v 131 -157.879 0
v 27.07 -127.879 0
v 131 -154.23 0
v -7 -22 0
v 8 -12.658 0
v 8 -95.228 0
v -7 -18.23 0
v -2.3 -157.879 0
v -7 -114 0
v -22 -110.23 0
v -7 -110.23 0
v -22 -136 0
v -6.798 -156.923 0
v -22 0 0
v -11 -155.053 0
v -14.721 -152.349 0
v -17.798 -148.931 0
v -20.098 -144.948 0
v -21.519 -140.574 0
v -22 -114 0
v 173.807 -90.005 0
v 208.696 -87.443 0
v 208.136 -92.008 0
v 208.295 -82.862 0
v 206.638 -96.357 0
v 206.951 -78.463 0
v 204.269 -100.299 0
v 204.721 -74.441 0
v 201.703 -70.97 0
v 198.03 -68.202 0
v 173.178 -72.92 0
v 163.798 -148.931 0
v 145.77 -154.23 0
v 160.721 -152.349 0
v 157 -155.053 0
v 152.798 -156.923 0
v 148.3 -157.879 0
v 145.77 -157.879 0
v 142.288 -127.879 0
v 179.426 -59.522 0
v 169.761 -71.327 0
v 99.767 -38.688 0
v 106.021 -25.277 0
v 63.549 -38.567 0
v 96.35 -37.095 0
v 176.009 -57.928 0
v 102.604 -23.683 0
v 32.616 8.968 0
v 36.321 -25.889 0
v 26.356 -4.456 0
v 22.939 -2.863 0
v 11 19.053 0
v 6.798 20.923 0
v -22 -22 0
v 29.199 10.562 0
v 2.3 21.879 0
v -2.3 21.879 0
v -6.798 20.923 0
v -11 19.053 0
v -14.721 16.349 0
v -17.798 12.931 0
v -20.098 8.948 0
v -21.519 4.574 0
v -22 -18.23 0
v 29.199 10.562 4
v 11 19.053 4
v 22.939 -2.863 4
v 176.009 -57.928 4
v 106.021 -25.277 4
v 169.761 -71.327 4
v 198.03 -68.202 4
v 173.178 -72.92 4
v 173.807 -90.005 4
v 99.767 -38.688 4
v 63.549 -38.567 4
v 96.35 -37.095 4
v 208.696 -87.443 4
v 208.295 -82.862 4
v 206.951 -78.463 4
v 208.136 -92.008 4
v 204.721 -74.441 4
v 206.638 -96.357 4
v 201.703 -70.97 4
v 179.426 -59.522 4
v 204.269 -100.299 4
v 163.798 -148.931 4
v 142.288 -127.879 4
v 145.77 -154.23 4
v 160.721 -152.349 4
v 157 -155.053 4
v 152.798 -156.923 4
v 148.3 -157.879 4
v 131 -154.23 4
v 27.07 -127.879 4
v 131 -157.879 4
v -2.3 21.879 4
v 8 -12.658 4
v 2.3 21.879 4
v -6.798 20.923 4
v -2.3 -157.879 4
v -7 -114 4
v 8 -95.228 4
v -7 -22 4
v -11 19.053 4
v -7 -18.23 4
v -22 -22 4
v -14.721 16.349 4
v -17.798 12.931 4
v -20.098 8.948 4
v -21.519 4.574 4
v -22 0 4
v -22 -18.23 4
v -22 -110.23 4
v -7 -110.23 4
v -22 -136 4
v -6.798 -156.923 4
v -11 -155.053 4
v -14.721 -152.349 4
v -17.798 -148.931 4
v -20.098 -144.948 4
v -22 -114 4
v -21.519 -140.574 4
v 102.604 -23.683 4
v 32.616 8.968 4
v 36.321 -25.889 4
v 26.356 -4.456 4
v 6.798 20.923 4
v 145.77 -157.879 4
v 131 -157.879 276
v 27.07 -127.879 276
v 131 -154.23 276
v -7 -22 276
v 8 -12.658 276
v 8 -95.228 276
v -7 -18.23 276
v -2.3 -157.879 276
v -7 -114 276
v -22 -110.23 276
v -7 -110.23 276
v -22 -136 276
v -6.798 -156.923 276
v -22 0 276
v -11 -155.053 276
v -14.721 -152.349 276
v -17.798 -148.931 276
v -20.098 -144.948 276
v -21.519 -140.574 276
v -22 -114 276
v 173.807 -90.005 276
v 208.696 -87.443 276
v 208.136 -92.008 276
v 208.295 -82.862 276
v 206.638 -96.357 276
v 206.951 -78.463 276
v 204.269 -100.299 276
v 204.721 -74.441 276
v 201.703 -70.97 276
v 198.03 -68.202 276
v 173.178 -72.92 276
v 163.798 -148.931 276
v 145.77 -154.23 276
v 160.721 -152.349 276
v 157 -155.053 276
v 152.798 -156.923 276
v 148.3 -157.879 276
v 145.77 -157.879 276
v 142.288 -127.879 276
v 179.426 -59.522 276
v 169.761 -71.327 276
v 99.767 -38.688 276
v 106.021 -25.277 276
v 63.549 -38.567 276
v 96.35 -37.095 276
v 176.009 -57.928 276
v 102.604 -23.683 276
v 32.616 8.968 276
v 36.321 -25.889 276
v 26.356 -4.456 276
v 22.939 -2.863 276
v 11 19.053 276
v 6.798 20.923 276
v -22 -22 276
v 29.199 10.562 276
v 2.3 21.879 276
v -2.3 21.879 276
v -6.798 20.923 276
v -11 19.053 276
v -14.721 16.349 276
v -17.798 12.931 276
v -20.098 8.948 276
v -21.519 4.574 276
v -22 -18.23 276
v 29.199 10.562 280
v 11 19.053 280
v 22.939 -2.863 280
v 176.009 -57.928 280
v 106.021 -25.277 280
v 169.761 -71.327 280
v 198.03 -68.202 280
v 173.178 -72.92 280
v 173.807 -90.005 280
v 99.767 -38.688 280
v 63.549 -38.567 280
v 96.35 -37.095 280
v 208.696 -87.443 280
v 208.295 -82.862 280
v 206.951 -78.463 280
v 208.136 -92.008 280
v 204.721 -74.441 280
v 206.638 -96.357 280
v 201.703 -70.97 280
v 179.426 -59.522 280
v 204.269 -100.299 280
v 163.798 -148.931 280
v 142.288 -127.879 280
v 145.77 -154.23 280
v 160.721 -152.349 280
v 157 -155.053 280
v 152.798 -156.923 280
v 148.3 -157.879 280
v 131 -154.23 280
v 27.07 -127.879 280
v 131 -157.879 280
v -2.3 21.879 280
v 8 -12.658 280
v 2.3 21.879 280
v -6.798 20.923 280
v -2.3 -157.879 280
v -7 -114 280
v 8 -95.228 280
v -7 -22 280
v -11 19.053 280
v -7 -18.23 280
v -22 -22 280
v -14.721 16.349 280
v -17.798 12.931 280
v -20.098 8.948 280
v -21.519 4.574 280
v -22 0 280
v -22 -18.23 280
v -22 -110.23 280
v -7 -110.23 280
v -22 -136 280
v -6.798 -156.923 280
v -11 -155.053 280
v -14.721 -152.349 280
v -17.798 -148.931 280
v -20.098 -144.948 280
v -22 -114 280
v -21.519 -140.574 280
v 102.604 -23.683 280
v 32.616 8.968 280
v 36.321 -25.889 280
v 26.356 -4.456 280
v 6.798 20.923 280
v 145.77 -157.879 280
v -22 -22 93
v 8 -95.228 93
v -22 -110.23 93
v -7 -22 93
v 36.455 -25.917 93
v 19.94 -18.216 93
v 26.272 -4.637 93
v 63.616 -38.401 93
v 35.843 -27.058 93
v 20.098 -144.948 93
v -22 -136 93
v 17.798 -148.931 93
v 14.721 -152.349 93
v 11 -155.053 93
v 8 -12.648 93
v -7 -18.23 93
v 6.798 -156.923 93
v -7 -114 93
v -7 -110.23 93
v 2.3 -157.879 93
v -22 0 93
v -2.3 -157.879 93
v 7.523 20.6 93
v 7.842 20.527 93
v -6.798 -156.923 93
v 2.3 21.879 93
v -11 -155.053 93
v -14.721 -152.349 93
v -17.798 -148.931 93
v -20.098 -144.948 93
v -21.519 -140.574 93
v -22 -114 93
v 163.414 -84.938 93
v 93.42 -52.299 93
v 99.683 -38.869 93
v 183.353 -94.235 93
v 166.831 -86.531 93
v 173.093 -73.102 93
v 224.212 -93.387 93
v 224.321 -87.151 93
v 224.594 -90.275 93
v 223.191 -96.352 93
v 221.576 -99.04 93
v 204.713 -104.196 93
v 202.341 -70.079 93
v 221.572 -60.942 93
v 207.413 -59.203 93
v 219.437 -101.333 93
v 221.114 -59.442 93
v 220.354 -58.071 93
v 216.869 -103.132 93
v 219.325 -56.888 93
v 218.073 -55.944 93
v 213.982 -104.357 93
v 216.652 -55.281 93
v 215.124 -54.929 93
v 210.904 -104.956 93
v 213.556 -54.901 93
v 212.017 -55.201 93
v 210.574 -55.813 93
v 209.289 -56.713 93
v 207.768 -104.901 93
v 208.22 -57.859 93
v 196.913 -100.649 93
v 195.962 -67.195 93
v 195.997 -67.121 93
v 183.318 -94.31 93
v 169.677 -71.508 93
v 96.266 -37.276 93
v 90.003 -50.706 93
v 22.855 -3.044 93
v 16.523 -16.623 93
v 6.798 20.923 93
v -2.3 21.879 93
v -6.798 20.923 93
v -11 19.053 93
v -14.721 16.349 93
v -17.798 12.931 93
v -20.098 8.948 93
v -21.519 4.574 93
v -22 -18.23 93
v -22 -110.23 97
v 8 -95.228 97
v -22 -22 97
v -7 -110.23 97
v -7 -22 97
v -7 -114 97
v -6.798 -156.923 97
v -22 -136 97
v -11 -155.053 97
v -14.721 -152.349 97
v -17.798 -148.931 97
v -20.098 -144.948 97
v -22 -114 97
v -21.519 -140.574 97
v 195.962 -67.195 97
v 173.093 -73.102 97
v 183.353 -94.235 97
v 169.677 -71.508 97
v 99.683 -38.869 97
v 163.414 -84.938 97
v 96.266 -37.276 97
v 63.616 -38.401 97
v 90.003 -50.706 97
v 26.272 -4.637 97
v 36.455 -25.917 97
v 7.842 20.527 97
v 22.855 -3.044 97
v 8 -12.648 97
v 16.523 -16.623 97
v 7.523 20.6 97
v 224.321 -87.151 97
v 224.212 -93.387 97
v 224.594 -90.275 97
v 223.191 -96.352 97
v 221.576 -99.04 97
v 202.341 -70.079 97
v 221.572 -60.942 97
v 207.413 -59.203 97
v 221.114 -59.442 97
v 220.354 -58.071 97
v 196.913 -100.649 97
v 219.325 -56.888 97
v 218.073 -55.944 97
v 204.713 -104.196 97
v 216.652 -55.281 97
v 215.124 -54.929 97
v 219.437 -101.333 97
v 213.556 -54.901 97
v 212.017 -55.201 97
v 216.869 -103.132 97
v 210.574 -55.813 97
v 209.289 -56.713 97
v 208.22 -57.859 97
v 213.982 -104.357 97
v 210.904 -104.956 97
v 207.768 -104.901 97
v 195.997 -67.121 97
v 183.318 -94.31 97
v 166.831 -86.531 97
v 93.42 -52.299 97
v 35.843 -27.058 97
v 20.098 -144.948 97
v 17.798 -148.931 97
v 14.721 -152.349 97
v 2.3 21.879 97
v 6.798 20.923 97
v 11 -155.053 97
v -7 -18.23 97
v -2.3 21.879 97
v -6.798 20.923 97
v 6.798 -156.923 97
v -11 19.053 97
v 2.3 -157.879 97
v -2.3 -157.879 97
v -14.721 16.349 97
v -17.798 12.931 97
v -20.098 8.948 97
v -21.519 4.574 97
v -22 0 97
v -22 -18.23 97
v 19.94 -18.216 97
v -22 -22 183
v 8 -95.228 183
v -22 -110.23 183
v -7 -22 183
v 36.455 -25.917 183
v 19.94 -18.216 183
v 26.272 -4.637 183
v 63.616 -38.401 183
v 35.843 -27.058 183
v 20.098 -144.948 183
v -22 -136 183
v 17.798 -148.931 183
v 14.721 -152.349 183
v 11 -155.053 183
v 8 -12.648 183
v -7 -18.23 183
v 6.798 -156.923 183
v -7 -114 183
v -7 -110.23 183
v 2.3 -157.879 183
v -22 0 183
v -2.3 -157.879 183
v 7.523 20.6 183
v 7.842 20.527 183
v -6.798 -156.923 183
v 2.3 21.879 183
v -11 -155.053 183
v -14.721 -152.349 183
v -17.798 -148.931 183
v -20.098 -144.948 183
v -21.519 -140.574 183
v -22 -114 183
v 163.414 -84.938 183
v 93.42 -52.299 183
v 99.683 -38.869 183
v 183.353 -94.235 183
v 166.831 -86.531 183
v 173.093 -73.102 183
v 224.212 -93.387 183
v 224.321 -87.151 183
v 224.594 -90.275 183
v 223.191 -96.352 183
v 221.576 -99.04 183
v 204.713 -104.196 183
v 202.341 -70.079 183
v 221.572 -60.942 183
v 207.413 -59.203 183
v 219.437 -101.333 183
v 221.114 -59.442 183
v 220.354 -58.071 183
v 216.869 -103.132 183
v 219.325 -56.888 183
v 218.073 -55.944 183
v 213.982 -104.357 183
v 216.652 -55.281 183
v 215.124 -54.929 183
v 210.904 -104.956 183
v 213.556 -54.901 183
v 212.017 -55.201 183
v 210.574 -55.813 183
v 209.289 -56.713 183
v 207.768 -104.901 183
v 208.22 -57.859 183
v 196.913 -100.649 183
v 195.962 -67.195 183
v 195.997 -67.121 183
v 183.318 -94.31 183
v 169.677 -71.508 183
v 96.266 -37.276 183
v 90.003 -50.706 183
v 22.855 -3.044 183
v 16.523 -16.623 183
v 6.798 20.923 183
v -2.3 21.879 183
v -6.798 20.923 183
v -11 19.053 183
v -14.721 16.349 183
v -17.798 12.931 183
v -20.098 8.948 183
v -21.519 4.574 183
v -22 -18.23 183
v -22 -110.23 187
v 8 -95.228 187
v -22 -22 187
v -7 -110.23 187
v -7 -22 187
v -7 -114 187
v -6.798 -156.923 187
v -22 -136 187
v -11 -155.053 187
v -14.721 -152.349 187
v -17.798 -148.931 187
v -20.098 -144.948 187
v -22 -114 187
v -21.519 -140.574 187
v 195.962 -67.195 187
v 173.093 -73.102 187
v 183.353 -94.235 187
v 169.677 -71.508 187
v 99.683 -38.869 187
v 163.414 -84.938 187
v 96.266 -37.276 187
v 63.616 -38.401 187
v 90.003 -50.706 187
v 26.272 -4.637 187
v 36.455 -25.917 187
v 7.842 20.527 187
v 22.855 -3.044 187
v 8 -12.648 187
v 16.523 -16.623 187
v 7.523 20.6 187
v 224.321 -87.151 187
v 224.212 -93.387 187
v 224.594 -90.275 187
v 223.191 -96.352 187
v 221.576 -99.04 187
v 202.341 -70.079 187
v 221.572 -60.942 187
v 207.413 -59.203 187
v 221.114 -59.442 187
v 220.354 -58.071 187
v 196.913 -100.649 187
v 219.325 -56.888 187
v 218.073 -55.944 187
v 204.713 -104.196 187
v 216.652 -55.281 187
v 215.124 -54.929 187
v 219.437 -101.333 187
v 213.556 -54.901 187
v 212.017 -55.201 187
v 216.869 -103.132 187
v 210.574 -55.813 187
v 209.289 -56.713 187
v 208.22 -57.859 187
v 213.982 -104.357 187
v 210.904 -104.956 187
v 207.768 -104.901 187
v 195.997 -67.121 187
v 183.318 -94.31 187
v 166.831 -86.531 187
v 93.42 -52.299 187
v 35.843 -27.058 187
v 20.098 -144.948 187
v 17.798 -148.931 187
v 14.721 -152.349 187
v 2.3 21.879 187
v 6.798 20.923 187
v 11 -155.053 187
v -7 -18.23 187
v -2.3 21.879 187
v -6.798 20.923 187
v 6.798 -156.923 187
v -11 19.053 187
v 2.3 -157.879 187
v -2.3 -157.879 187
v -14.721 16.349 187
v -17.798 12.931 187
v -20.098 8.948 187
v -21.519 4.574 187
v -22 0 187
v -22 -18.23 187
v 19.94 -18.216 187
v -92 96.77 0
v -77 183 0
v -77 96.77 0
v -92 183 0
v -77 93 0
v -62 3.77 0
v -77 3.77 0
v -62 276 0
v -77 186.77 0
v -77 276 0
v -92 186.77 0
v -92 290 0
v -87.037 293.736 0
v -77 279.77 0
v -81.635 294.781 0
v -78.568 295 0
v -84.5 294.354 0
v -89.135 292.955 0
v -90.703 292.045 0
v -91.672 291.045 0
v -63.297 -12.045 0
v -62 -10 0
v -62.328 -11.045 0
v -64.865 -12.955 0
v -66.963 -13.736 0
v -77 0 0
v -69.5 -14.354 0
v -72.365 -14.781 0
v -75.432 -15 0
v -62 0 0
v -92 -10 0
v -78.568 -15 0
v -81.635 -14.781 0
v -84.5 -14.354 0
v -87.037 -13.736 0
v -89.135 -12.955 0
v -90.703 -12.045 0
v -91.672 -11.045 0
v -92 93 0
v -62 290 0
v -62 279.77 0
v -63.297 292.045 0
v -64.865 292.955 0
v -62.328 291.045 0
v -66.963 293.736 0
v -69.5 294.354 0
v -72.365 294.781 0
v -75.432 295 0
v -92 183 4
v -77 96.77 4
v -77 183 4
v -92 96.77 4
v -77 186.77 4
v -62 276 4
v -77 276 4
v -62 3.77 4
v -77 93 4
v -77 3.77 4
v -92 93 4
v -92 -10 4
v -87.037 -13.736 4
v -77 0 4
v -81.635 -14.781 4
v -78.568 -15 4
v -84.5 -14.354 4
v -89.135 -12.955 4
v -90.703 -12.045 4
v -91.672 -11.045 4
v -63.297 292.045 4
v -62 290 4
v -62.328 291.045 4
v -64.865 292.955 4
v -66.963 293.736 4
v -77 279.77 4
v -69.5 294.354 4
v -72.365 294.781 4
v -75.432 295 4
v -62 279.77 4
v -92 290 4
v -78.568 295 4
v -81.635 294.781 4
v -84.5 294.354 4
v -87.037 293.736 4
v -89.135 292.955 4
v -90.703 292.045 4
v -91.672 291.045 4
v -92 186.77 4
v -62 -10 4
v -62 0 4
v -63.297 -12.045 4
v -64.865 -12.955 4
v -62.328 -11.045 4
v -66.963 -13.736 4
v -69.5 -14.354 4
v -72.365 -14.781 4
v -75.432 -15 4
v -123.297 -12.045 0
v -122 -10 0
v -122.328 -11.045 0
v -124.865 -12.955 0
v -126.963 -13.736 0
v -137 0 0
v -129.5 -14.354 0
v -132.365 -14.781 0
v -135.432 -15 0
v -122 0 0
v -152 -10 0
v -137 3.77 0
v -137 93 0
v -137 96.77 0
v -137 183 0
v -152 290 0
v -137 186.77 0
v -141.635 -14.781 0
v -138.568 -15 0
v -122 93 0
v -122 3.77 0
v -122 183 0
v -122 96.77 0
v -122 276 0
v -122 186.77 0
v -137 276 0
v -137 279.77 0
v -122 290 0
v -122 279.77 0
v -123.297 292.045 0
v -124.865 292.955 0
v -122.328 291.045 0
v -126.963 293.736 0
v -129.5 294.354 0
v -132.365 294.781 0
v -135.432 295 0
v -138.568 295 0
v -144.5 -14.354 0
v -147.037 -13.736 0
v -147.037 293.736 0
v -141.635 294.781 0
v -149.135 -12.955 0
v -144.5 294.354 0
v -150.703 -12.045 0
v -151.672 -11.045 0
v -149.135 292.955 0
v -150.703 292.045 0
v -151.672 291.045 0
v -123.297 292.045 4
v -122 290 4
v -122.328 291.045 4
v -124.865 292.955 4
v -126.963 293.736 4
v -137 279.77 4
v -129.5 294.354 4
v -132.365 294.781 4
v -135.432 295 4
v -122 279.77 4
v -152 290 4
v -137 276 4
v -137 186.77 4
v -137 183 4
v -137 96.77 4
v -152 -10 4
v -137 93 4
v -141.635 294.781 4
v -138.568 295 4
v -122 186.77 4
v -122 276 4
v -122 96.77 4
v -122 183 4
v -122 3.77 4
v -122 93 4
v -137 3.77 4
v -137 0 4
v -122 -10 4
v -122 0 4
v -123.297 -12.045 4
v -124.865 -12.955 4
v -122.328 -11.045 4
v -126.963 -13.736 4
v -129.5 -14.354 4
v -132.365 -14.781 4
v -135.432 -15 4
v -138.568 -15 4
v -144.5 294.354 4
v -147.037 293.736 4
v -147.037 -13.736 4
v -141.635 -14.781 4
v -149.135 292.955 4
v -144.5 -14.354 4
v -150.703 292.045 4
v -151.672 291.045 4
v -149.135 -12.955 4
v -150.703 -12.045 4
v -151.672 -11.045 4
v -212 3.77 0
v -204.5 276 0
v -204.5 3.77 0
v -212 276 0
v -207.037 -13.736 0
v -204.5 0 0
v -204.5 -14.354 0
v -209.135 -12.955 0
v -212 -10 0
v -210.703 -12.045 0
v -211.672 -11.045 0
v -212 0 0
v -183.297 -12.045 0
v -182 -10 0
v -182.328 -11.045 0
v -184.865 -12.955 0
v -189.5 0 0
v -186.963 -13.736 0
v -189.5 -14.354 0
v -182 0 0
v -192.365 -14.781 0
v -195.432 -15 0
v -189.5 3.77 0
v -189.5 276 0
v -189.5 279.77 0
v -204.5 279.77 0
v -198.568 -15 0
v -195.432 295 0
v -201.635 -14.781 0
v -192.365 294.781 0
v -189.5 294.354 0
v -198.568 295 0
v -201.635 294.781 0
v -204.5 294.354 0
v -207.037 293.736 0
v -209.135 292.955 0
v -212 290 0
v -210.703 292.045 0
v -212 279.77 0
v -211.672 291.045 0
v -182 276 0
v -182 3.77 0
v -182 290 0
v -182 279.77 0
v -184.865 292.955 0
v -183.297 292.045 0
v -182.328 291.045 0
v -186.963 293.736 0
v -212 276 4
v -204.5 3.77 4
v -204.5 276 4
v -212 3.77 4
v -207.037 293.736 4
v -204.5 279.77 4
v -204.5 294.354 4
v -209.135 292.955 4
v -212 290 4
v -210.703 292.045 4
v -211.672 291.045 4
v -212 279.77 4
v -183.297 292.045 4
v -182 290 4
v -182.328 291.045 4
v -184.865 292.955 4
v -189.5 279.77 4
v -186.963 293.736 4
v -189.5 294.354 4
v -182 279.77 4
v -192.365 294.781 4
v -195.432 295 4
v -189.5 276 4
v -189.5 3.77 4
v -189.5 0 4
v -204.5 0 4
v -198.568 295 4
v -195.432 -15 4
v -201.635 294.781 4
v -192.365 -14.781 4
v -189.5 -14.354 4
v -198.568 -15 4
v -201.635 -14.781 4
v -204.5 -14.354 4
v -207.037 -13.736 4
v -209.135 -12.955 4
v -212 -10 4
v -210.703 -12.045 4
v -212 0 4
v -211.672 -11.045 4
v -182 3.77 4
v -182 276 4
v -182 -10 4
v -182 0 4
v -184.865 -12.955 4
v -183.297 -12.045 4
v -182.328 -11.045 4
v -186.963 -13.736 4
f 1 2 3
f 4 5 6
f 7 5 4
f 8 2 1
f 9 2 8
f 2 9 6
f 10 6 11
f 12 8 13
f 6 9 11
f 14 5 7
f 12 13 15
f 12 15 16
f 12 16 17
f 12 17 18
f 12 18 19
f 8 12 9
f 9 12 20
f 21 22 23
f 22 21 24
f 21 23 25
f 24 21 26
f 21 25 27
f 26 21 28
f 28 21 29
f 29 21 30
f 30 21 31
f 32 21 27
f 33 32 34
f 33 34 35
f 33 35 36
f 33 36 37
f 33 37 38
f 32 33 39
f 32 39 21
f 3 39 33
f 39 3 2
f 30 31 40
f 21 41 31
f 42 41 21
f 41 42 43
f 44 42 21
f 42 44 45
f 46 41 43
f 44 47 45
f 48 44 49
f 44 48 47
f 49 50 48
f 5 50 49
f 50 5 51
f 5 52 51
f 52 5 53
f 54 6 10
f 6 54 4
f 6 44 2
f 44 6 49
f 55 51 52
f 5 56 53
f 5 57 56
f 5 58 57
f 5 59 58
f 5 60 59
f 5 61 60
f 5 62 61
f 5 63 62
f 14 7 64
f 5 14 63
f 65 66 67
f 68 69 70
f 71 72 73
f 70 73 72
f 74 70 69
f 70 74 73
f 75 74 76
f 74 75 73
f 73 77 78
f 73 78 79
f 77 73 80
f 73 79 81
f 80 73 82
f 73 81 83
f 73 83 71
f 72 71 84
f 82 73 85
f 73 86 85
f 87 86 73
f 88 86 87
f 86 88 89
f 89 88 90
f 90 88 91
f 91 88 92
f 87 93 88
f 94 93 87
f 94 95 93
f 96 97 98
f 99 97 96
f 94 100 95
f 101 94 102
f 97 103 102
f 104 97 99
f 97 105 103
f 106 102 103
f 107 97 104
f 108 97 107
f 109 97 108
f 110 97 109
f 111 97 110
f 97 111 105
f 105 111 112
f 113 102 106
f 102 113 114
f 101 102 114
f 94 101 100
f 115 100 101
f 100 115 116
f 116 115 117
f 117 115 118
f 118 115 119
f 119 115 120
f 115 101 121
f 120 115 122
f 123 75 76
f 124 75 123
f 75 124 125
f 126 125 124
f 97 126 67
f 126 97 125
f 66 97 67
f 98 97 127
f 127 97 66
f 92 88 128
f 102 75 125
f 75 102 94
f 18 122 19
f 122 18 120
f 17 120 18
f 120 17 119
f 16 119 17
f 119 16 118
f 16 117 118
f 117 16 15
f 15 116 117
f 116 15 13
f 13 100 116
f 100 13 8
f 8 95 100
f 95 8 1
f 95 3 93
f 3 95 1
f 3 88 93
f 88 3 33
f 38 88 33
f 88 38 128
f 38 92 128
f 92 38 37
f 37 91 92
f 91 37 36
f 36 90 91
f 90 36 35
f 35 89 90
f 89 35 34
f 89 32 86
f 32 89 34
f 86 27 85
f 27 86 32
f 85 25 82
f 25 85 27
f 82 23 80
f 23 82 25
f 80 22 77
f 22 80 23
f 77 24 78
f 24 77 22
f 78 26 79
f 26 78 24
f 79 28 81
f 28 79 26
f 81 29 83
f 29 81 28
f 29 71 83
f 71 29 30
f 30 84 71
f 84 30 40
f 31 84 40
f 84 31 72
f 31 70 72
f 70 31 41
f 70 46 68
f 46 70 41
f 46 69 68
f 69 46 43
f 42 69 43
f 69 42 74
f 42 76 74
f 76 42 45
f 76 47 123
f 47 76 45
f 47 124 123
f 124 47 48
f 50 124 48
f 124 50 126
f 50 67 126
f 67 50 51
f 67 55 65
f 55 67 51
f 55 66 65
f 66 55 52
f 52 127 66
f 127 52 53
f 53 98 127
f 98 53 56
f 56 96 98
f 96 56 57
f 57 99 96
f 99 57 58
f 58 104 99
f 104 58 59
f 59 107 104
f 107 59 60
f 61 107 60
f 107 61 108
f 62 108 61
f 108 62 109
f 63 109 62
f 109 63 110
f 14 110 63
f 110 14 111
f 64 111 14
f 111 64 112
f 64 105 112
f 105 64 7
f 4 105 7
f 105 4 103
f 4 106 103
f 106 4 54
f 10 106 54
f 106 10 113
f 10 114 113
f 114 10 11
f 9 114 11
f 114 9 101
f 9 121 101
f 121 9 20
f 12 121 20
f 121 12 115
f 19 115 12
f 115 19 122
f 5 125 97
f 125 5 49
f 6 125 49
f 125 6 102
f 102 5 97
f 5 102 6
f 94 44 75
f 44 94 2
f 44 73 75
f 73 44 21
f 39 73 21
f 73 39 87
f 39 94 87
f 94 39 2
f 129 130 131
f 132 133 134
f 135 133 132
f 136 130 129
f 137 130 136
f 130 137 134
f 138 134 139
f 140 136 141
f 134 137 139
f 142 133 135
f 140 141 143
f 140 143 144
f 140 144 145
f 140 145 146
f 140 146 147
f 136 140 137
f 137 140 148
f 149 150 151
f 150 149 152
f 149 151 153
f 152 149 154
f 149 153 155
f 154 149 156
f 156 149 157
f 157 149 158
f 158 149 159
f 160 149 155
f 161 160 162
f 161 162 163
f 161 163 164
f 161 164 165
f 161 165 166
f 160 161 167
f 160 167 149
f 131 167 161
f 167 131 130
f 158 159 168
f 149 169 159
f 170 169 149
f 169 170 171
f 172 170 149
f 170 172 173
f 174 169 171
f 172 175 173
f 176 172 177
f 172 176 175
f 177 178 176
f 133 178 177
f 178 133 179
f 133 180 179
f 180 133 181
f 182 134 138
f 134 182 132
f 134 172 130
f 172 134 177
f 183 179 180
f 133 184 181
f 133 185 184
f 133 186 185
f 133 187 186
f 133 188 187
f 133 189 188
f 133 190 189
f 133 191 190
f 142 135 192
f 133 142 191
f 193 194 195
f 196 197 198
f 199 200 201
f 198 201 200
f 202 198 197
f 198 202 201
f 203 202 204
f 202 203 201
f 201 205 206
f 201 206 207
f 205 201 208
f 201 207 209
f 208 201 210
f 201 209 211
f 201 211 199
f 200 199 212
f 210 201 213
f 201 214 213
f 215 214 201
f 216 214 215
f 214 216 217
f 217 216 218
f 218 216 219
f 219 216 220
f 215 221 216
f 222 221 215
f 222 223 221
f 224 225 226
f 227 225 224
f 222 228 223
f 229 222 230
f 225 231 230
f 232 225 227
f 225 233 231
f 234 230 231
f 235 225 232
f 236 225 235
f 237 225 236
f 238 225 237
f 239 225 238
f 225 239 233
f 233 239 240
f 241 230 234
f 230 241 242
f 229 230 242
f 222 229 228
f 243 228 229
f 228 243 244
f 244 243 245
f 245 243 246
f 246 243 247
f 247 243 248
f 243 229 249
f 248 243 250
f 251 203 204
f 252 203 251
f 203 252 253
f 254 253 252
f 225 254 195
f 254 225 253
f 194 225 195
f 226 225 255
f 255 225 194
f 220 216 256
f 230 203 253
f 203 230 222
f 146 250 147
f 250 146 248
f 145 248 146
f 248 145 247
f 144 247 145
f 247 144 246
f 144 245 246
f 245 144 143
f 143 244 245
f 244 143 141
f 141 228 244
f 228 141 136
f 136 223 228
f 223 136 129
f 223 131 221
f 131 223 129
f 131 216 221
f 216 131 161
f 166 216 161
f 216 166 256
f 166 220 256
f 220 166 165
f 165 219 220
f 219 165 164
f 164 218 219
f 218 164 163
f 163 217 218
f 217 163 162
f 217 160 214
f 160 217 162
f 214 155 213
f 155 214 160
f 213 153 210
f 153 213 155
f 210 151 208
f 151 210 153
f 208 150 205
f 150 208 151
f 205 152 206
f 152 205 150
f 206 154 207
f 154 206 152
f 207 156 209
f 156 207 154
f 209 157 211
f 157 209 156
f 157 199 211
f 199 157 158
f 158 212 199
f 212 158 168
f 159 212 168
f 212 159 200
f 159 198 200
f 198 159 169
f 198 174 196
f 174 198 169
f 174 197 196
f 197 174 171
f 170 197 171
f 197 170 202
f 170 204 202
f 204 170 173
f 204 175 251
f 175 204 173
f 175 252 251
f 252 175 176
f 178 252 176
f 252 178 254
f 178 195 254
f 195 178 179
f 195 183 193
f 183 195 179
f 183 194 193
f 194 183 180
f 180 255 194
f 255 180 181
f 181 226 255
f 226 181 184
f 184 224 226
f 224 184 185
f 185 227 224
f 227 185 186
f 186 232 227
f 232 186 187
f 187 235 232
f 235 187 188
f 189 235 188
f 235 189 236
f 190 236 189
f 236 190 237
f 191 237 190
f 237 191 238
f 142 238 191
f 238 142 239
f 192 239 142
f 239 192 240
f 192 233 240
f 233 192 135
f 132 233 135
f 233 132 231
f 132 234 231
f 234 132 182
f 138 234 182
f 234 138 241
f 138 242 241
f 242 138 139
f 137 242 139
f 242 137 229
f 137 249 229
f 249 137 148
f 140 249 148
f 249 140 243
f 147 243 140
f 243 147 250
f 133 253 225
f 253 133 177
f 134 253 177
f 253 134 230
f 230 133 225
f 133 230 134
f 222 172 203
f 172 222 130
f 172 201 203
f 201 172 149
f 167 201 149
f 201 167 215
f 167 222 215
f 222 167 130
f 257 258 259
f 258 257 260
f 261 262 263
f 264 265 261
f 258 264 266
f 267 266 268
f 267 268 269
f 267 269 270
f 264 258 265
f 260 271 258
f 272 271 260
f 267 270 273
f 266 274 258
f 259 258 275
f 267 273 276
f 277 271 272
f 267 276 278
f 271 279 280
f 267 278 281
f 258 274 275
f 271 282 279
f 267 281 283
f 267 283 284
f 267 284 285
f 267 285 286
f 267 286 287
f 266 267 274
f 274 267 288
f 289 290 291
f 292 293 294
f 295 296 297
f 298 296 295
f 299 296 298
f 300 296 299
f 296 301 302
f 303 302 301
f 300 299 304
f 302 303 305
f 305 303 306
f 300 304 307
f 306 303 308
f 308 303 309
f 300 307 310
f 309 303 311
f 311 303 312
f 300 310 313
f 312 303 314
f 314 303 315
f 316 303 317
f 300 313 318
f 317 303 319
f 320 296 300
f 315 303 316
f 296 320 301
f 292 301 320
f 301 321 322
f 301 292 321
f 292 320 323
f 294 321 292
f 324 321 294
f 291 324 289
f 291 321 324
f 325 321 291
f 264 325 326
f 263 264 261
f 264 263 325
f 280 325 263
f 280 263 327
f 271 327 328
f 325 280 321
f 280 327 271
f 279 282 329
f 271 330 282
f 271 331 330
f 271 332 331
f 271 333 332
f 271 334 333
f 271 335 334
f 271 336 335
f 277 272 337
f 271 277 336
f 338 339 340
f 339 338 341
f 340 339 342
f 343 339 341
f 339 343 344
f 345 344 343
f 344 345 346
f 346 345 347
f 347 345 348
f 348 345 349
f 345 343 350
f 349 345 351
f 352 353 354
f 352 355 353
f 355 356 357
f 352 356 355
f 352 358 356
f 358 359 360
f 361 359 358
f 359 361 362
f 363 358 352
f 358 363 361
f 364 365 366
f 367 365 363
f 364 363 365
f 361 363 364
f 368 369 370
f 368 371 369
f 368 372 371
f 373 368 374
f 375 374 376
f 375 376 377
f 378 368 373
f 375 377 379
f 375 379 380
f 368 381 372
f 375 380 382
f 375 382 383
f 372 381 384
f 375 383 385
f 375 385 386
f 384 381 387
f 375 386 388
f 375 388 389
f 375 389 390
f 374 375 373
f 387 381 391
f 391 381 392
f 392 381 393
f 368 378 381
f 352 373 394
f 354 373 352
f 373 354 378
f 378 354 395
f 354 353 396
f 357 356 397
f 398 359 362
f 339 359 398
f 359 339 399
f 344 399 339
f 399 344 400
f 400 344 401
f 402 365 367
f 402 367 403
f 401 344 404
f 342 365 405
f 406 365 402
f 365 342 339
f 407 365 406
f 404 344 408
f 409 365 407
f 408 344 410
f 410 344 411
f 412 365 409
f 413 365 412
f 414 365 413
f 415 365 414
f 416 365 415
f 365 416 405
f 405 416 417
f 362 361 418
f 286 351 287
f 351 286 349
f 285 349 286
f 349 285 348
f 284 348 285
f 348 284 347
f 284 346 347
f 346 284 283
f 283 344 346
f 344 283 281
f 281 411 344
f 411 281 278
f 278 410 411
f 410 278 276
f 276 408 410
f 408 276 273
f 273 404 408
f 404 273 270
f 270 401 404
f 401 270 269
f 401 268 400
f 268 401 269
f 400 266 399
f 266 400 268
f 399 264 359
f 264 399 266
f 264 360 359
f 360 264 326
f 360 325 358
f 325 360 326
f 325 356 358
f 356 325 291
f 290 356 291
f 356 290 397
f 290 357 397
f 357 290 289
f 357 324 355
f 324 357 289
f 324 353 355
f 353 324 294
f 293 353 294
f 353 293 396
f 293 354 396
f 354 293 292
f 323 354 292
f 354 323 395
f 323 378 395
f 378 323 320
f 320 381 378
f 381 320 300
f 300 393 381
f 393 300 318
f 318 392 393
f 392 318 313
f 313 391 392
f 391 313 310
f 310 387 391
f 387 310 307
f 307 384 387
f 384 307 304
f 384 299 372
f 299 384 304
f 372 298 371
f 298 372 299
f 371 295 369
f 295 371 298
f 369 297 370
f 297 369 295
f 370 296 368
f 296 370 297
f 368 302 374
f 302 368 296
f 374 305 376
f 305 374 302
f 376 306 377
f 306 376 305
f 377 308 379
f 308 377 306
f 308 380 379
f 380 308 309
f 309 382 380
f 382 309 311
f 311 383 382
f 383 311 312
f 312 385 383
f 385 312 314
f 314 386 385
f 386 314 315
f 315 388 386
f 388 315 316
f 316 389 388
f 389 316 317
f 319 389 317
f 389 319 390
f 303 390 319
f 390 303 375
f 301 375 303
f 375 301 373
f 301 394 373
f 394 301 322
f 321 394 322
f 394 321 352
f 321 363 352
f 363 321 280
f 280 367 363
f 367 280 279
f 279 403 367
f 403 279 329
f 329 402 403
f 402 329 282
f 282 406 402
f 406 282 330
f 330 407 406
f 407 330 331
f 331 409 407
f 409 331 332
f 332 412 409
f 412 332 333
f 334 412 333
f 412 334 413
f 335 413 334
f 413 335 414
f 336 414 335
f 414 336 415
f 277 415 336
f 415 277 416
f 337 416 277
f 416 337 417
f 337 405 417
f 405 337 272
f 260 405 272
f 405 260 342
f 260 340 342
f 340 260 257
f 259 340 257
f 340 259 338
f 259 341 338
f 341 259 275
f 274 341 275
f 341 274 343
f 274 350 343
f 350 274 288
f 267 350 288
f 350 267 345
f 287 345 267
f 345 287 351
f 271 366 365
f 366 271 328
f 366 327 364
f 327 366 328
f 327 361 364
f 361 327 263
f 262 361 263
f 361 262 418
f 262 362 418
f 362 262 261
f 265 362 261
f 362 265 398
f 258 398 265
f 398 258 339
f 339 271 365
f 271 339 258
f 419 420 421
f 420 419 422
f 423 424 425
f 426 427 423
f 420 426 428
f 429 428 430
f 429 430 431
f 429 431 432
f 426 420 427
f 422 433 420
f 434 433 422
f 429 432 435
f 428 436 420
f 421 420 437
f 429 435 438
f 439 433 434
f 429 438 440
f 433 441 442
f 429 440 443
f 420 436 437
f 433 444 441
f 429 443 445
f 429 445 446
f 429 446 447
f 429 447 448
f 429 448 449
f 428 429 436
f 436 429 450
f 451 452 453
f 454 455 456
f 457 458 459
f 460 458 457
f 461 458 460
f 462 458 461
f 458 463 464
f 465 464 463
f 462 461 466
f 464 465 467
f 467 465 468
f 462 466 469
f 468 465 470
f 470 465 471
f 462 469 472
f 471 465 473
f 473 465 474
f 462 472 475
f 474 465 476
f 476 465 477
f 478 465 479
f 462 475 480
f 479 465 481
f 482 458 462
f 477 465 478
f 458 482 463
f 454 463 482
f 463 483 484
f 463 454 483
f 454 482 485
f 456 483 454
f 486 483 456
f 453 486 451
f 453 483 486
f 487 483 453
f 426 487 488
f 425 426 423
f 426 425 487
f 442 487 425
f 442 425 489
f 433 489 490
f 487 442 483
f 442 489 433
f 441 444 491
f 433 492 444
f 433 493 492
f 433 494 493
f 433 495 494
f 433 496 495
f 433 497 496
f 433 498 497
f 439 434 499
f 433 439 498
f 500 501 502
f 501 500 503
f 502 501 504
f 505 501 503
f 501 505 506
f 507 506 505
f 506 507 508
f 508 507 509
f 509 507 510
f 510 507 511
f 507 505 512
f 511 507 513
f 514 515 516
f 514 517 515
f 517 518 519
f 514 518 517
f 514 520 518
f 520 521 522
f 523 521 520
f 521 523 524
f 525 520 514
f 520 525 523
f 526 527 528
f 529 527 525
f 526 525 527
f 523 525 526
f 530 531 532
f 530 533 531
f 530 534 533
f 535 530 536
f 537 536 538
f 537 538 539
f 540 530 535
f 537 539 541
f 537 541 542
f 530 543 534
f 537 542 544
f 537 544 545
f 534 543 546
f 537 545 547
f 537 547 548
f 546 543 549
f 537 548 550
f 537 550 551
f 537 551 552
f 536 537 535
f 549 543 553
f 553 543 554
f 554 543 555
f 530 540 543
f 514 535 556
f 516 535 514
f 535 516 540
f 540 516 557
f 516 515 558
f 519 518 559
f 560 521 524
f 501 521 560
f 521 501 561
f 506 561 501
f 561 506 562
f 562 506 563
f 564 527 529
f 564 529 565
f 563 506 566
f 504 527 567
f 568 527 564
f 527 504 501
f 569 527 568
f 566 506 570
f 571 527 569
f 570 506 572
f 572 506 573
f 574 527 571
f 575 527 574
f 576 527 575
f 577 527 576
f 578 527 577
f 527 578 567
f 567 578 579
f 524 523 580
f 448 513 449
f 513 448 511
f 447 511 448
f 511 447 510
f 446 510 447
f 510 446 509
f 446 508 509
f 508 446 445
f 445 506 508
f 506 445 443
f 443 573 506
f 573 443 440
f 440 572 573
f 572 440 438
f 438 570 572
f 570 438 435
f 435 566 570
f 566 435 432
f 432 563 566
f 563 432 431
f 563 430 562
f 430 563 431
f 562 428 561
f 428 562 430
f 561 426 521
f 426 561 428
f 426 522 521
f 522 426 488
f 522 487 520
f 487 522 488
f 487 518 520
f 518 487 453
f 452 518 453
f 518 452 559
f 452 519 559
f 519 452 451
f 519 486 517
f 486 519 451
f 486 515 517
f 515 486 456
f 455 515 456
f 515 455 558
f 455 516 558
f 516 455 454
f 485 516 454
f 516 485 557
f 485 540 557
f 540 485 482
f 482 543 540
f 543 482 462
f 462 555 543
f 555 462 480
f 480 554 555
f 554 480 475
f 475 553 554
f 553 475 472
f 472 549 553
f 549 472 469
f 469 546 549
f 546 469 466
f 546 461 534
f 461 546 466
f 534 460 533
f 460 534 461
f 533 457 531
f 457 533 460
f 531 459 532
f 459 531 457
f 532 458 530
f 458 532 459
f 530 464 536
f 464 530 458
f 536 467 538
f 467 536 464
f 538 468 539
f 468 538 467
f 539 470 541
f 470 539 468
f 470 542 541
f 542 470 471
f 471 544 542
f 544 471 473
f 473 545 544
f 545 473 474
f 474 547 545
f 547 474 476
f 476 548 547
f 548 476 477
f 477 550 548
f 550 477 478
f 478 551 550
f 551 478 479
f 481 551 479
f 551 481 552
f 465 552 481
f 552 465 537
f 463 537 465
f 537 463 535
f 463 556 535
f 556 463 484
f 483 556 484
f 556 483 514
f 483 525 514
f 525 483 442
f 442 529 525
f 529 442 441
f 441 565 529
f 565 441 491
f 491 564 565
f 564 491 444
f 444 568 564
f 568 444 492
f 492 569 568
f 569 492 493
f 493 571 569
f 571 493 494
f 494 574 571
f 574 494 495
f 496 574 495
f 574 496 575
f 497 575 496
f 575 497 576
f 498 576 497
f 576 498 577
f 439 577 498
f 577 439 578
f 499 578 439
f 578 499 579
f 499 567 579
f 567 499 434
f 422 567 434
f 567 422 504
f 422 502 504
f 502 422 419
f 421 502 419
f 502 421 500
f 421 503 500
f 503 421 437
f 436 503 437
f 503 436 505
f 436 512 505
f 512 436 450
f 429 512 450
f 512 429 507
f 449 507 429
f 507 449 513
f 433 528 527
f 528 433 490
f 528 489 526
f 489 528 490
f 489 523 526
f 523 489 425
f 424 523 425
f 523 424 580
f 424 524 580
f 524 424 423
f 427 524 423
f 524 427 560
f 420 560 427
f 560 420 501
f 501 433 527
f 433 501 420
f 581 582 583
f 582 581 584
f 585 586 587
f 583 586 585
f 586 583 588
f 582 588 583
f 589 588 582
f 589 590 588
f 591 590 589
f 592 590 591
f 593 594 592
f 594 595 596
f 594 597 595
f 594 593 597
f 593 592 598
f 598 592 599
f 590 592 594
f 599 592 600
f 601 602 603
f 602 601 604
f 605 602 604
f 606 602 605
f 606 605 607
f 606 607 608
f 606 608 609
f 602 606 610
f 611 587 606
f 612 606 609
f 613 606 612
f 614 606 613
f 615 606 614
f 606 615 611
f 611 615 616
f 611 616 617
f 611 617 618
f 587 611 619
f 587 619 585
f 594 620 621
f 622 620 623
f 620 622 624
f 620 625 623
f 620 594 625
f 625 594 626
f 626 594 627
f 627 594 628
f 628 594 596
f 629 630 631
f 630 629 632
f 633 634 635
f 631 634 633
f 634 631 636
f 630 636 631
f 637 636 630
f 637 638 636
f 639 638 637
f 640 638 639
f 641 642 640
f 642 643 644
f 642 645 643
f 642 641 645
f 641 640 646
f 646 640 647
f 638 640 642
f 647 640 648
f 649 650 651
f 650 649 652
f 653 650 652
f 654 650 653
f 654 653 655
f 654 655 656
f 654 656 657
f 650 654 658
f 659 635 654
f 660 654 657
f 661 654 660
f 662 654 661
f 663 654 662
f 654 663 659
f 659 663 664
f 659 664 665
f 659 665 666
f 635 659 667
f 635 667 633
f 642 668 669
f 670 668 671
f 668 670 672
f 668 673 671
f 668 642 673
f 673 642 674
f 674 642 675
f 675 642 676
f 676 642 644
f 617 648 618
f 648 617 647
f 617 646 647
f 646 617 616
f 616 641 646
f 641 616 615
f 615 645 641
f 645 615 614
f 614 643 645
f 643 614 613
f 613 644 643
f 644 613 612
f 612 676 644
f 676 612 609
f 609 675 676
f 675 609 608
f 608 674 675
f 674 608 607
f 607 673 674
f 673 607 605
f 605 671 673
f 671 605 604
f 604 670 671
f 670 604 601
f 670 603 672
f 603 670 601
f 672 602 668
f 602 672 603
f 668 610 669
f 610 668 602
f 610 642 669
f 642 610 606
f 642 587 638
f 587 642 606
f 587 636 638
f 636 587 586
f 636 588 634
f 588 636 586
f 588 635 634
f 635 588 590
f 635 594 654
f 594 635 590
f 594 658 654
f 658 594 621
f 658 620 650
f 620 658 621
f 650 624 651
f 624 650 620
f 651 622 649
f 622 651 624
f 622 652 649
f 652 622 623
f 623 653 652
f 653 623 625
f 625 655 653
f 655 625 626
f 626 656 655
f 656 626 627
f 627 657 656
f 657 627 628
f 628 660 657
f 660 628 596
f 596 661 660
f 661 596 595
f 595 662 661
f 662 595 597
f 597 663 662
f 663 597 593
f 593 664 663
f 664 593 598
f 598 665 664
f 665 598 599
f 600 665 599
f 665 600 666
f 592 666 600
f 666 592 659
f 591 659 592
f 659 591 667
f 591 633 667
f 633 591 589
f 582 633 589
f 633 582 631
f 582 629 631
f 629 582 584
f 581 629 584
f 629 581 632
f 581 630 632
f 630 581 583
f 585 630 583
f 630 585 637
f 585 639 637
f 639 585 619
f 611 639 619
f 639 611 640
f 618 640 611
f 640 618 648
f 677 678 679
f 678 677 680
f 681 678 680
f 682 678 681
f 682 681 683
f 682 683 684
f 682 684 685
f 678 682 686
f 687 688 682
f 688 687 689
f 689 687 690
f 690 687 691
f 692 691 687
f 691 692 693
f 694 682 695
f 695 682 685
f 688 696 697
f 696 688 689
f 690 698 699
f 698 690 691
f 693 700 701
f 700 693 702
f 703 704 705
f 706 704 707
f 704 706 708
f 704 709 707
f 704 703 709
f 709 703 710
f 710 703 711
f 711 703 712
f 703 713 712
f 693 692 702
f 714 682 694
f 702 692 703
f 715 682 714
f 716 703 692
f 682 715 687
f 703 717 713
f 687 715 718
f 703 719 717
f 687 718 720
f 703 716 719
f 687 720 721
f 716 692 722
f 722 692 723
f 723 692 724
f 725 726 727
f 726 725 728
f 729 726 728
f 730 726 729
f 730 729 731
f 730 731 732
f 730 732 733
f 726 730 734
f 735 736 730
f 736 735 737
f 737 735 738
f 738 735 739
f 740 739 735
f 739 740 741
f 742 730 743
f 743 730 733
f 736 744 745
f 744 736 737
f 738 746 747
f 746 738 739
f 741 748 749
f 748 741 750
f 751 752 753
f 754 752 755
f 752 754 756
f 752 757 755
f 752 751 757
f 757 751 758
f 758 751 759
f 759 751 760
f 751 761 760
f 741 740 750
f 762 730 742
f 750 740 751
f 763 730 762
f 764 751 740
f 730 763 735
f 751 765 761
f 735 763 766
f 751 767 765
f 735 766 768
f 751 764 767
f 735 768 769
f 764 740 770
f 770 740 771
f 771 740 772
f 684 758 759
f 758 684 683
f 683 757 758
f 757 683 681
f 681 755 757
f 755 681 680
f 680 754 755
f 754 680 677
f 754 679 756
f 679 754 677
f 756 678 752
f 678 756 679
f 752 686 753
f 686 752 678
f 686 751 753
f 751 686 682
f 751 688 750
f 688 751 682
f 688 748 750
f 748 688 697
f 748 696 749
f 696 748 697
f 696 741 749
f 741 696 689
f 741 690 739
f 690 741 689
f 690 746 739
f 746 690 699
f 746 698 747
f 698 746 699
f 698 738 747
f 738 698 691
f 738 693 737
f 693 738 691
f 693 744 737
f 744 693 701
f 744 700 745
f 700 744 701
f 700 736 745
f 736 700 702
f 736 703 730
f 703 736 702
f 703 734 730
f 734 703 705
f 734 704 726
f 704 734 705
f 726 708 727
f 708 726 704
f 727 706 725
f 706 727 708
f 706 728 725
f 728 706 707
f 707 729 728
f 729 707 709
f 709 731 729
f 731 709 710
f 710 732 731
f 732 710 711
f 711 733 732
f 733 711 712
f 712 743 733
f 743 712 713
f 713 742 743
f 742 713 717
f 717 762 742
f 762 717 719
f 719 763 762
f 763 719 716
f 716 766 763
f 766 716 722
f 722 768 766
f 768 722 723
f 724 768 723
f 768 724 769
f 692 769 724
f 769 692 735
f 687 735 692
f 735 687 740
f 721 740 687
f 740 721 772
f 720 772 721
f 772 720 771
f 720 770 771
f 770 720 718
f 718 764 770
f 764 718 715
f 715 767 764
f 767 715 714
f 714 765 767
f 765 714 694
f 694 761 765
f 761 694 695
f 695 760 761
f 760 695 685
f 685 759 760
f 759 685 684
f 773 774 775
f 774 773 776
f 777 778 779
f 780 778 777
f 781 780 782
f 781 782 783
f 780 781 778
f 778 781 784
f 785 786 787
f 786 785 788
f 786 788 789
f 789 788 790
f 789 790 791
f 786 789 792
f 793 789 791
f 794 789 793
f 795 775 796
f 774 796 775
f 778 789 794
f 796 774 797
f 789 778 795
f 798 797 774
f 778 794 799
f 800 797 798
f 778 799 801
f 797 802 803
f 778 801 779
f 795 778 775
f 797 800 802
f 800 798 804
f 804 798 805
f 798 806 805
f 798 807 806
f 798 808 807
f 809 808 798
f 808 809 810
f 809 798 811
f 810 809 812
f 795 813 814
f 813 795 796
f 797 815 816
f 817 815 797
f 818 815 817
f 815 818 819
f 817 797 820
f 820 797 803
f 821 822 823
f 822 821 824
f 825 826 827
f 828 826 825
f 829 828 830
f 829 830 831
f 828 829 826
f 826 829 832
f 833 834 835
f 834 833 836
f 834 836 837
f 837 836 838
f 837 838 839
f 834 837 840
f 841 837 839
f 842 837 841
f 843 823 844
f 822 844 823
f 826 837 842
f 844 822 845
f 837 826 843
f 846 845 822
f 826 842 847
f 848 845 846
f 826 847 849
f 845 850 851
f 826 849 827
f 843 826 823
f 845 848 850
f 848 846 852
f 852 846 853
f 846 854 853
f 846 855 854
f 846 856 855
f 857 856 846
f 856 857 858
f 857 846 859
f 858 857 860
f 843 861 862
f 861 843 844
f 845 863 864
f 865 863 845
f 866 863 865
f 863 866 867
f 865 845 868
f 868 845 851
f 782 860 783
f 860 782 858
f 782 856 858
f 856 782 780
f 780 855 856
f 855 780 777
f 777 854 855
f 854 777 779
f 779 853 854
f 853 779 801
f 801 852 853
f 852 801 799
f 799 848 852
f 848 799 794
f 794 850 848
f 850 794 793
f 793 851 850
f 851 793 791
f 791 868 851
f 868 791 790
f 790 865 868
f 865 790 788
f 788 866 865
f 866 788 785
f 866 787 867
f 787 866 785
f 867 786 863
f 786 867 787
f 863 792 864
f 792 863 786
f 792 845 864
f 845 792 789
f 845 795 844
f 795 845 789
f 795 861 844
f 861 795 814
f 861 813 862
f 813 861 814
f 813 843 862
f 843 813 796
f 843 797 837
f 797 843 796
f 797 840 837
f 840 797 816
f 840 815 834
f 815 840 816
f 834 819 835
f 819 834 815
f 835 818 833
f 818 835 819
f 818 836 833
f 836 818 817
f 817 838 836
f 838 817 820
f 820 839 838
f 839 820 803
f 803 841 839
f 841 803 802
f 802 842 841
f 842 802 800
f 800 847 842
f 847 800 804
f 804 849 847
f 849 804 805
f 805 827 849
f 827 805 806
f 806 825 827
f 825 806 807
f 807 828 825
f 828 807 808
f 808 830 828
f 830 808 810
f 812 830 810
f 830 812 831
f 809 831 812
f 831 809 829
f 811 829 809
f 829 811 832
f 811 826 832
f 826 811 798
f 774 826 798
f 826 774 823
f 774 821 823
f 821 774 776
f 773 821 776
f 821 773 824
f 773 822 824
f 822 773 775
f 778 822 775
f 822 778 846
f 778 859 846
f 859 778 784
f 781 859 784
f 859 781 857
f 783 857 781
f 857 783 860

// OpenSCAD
/*[ Stand properties.  Size to your laptop]*/

//Thickness of material used (subtract as needed to account for kerf)
material_thickness = 4.0; //[1 : 0.1 : 20]

//The size of the kerf (4mm MDF = 0.23) (size to materiel and machine)
kerf = 0.23; //[0 : 0.01 : 0.5]

//the total width of the stand (not including any overhang)
stand_width = 280; //[200 : 5 : 500]

//Optional crossmember overhang for pressfit side support
cross_member_overhang = 10; //[0 : 1 :50]

//Height of the back of the stand
stand_height = 180; //[100 : 5 : 300]

//Depth bottom edge support legs (shorter than upper deck but too short and stand will be unstable)
lower_deck_depth = 190; //[150 : 5 : 300]

//Upper deck depth (too short and laptop will fall off the back, too long and stand will be unstable)
upper_deck_depth = 250; //[200 : 5 : 300]

//The angle of the upper deck. Generally between 20-30 degress, increase to make steeper
upper_deck_angle = 25; //[0 : 1 : 40]

/*[ Support structure properties]*/

//The width of the side spars, set too thin will make for a fragile stand
side_spar_thickness = 30; //[20 : 1 : 40]

//The suggested spacing between supports. Automatically adjusts support numbers for optimal placement
spar_spacing = 70; //[10 : 1 : 100]

//The suggested spacing between cross members. Automatically adjusts support numbers for optimal placement
cross_member_spacing = 60;//[10 : 1 : 100]

//Adjustment to move internal supports when there are conflicts with crossmembers
internal_spar_upper_deck_depth_divisor = 0.25; //[0.1 : 0.05 : 1]

//increase the number of end layers for increased stand strength with thinner materiels
edge_supports_layers = 1; //[1 : 1 : 10]

//The radius of corners, Smaller numbers make for sharper corners
curve_radius = 22; //[15 : 1 : 35]

/*[ Laptop Lip properties. Size appropriately to your laptop]*/

//The center width of supports with lips. For better stability > 90 is reccomended
upper_deck_front_lip_width = 94; //[50 : 5 : 400]

//The height the lip needed to catch the front edge of your laptop
upper_deck_front_lip_height = 12; //[0 : 5 : 50]

//The length the laptop can extends past the front of the top deck.
upper_deck_front_lip_depth = 0; //[-20 : 5 : 30]

//Cuts holes for a middle crossmember for extra support with thinner or deeper stands
use_bottom_mid_crossmember = "false";//[true, false]

/*[ Model properties.]*/

//The resolution of the curves. Higher values give smoother curves but increases render time.
resolution = 30; //[10 : 10 : 120]

//show 2d projection of individual parts with a 100mm square for scale
projection = "false";//[true, false]

$fn = resolution;

actualStandWidth = stand_width - material_thickness;
acutalLipWidth = upper_deck_front_lip_width - material_thickness;
upper_deck_rear_height = stand_height - 2 * curve_radius;
actual_lower_deck_depth = lower_deck_depth - curve_radius;
actual_upper_deck_depth = upper_deck_depth - curve_radius;

if (projection == "true") {
    //end support
    projection() side(true, false);
    //inner support
    projection() translate([0,upper_deck_rear_height * 1.5,0] )side(true, true);
    //inner support with lip
    projection() translate([actual_lower_deck_depth * 1.5,0 ,0] )side(false, true);
    //cross member
    projection()  translate ([-10-curve_radius-(side_spar_thickness * 2),0,0]) crossMember(true);
    projection()  translate ([-10-curve_radius-(side_spar_thickness * 4),0,0]) crossMember(false);
    projection() translate ([-10-curve_radius-(side_spar_thickness * 6),0,0]) bottomRightCrossMember();
    
    //scale
    translate([actual_lower_deck_depth * 1.5, upper_deck_rear_height,0] ) square([100,100]);

} else {
    supportStructure();
    translate ([-10-curve_radius-(side_spar_thickness * 2),0,0]) crossMember(true);
    translate ([-10-curve_radius-(side_spar_thickness * 4),0,0]) crossMember(false);
    translate ([-10-curve_radius-(side_spar_thickness * 6),0,0]) bottomRightCrossMember();
}

module supportStructure() {    
    normal_spar_count = floor(actualStandWidth / spar_spacing);
    normal_spar_spacing = actualStandWidth  / normal_spar_count;
    
    lipspaceLeft  = actualStandWidth / 2.0 - acutalLipWidth / 2.0;
    lipspaceRight = actualStandWidth / 2.0 + acutalLipWidth / 2.0;

    for(i=[0:normal_spar_count]) {
        if (upper_deck_front_lip_height == 0 || i * normal_spar_spacing < lipspaceLeft || i * normal_spar_spacing > lipspaceRight) {
            if ( i==0 || i == normal_spar_count) {
                    translate([0,0,i*normal_spar_spacing]) color("red") side(true, false);
            } else {
                if (abs(i*normal_spar_spacing - lipspaceLeft) > 5 && abs(i*normal_spar_spacing - lipspaceRight) > 5) {
                    translate([0,0,i*normal_spar_spacing]) side(true, true);
                }
            }
        } 
    }
    
    //double up end supports?
    if (edge_supports_layers > 1) {
        for(i=[2:edge_supports_layers]) {
            diff = i - 1;
            translate([0,0,diff*material_thickness]) color("red") side(true, false);
            translate([0,0,actualStandWidth - diff*material_thickness]) color("red") side(true, false);
        }
   }
     
    //add 2 lipped spars
    if (upper_deck_front_lip_height > 0) {
       normal_lip_count = floor(acutalLipWidth / spar_spacing);
       if (normal_lip_count < 2) {
            translate([0,0,lipspaceLeft]) color("green") side(false, true);
            translate([0,0,lipspaceRight]) color("green") side(false, true);
      } else {
           normal_lip_spacing = acutalLipWidth / normal_lip_count;
           for(i=[0:normal_lip_count]) {
                translate([0,0,lipspaceLeft + i*normal_lip_spacing]) color("blue") side(false, true);
            }
        }
    }
 
}


module side(hideLip, isInternal) {    
    linear_extrude(height=material_thickness) {
        difference() { //remove crossmember holes
            union() {
                if (!isInternal) {
                    difference() {
                        edgeSidePieces();     
                        offset(r = -side_spar_thickness) edgeSidePieces();
                    }
                   difference() {
                        edgeSupportPieces();     
                        offset(r = -side_spar_thickness) edgeSupportPieces();
                    }
                } else {
                    difference() {
                        internalSidePieces();     
                        offset(r = -side_spar_thickness) internalSidePieces();
                    }
                }
                     
                if (!hideLip) {
                    topDeckLip();
                }
            }
            //subtract cross members
            crossMemberHoles(isInternal);
        }
    }
}

module edgeSupportPieces() {
         hull () {
        //top left
        translate([0, 0, 0]) circle(r=curve_radius);
        //top right
        rotate([0,0,-upper_deck_angle]) translate([(actual_upper_deck_depth - curve_radius) * internal_spar_upper_deck_depth_divisor , 0, 0]) circle(r=curve_radius);
        //bottom left
        translate([0, -upper_deck_rear_height, 0]) circle(r=curve_radius);
        
     }
 }

module edgeSidePieces() {
    hull () {
        //top left
        translate([0, 0, 0]) circle(r=curve_radius);
        //top right
        rotate([0,0,-upper_deck_angle]) translate([actual_upper_deck_depth - curve_radius, 0]) circle(r=curve_radius);
        //bottom left
        translate([0, -upper_deck_rear_height, 0]) circle(r=curve_radius);
        //bottom right
         translate([actual_lower_deck_depth - curve_radius, -upper_deck_rear_height, 0]) circle(r=curve_radius);
    }
}

module internalSidePieces() {
    union() {
                   rotate([0,0,-upper_deck_angle]) hull () {
                       //make sure spar extends out to lip
        translate([0, curve_radius - side_spar_thickness/2.0, 0]) circle(d=side_spar_thickness);
         translate([actual_upper_deck_depth - curve_radius, curve_radius - side_spar_thickness/2.0, 0]) circle(d=side_spar_thickness);

                   }

    difference() {
    hull () {
        //top left
        translate([0, 0, 0]) circle(r=curve_radius);
        //top right
        rotate([0,0,-upper_deck_angle]) translate([(actual_upper_deck_depth - curve_radius) * internal_spar_upper_deck_depth_divisor , 0, 0]) circle(r=curve_radius);
        //bottom left
        translate([0, -upper_deck_rear_height, 0]) circle(r=curve_radius);
        
     }
     }
    }

}

module topDeckLip() {
    //top right
    rotate([0,0,-upper_deck_angle])
    union() {
            hull () {
                     translate([actual_upper_deck_depth - curve_radius, curve_radius - side_spar_thickness, 0]) square([side_spar_thickness/2.0,side_spar_thickness]);
                     translate([actual_upper_deck_depth + upper_deck_front_lip_depth, curve_radius - side_spar_thickness/2.0, 0]) circle(d=side_spar_thickness);
            }
             hull () {
                     translate([actual_upper_deck_depth + upper_deck_front_lip_depth, curve_radius - side_spar_thickness/2.0, 0]) circle(d=side_spar_thickness);
                     translate([actual_upper_deck_depth + upper_deck_front_lip_depth - side_spar_thickness/4.0, curve_radius + upper_deck_front_lip_height, 0]) circle(d=side_spar_thickness/2.0);

        }
    }  
}

module crossMemberHoles(isInternal) {
    
    //back members
    actual_back_height = upper_deck_rear_height - 2 *curve_radius;
    back_crossMember_count = floor(actual_back_height / cross_member_spacing);
    back_crossMember_spacing = actual_back_height  / back_crossMember_count;
       
    //do not stagger back, makes assembly hard
    for(i=[0:back_crossMember_count]) {
        translate([-curve_radius,-i * back_crossMember_spacing - curve_radius,0]) 
            square([side_spar_thickness / 2.0, material_thickness - kerf]);
         
    }

    //top members
    actual_top_depth = actual_upper_deck_depth - 3 * curve_radius;
    top_crossMember_count = floor(actual_top_depth / cross_member_spacing);
    top_crossMember_spacing = actual_top_depth  / top_crossMember_count;
       
    for(i=[0:top_crossMember_count]) {
            if (isInternal) { //stagger holes
              rotate([0,0,-upper_deck_angle]) 
                translate([i * top_crossMember_spacing + curve_radius ,curve_radius - side_spar_thickness-0.1,0]) 
                    square([material_thickness - kerf,side_spar_thickness / 2.0]);
            } else {
               rotate([0,0,-upper_deck_angle]) 
                translate([i * top_crossMember_spacing + curve_radius ,curve_radius - side_spar_thickness / 2.0 +0.1,0]) 
                    square([material_thickness - kerf,side_spar_thickness / 2.0]);
         }
    }
    
    //bottom right
    translate([actual_lower_deck_depth - (curve_radius + side_spar_thickness / 2.0) ,-upper_deck_rear_height - curve_radius,0]) 
                    square([side_spar_thickness / 2.0 - kerf, material_thickness - kerf]);

    if (use_bottom_mid_crossmember == "true") {
     //bottom mid
        translate([actual_lower_deck_depth/2.0 - (curve_radius/2.0) ,-upper_deck_rear_height - curve_radius,0]) 
                    square([side_spar_thickness / 2.0 - kerf, material_thickness - kerf]);
    }


}

module basicCrossMember() {
           hull() {
            square([side_spar_thickness, stand_width]);
            if (cross_member_overhang > 0) {
                if (cross_member_overhang < side_spar_thickness) {
                    translate([side_spar_thickness/2.0,-cross_member_overhang,0]) 
                        resize([side_spar_thickness, cross_member_overhang, 0])
                            circle(d=side_spar_thickness);
                    translate([side_spar_thickness/2.0,stand_width+cross_member_overhang,0]) 
                           resize([side_spar_thickness, cross_member_overhang, 0])
                                circle(d=side_spar_thickness);        
                    }else {
                    translate([side_spar_thickness/2.0,-cross_member_overhang,0]) 
                                circle(d=side_spar_thickness);
                    translate([side_spar_thickness/2.0,stand_width+cross_member_overhang,0]) 
                                circle(d=side_spar_thickness);
                }
            } 
        }
    }

module bottomRightCrossMember() {
        linear_extrude(height=material_thickness) {
  
    difference() {

       //material
        basicCrossMember();
    
      //doubled up end supports?
        for(i=[1:edge_supports_layers]) {
            diff = i - 1;
            translate([0,diff*material_thickness,0]) square([side_spar_thickness/4.0, material_thickness-kerf]);
            translate([3*side_spar_thickness/4.0,diff*material_thickness,0]) square([side_spar_thickness/4.0, material_thickness-kerf]);
            translate([0,actualStandWidth - diff*material_thickness,0]) square([side_spar_thickness/4.0, material_thickness-kerf]);
            translate([3*side_spar_thickness/4.0,actualStandWidth - diff*material_thickness,0]) square([side_spar_thickness/4.0, material_thickness-kerf]);
          }
      }
  }

}

module crossMember(isReversed) {
    
        linear_extrude(height=material_thickness) {

    difference() {

        //material
        basicCrossMember();   
        //cutouts
        
        normal_spar_count = floor(actualStandWidth / spar_spacing);
        normal_spar_spacing = actualStandWidth  / normal_spar_count;

        lipspaceLeft  = actualStandWidth / 2.0 - acutalLipWidth / 2.0;
        lipspaceRight = actualStandWidth / 2.0 + acutalLipWidth / 2.0;

        for(i=[0:normal_spar_count]) {
            if (upper_deck_front_lip_height == 0 ||  (abs(i*normal_spar_spacing - lipspaceLeft) > 5 && abs(i*normal_spar_spacing - lipspaceRight) > 5)) {
                if ( i==0 || i == normal_spar_count || !isReversed) { //edge
                    translate([side_spar_thickness/2.0,i*normal_spar_spacing,0]) square([side_spar_thickness/2.0, material_thickness-kerf]);
                } else { //internal
                    translate([0,i*normal_spar_spacing,0]) square([side_spar_thickness/2.0, material_thickness-kerf]);
                }
            } 
        }
            
        //doubled up end supports?
        if (edge_supports_layers > 1) {
            for(i=[2:edge_supports_layers]) {
                diff = i - 1;
                translate([side_spar_thickness/2.0,diff*material_thickness,0]) square([side_spar_thickness/2.0, material_thickness-kerf]);
                translate([side_spar_thickness/2.0,actualStandWidth - diff*material_thickness,0]) square([side_spar_thickness/2.0, material_thickness-kerf]);
              }
       }
             
        //add 2 lipped spars
 
        if (upper_deck_front_lip_height > 0) {
           normal_lip_count = floor(acutalLipWidth / spar_spacing);
           if (normal_lip_count < 2) {
               if (!isReversed) {
                 translate([side_spar_thickness/2.0,lipspaceLeft,0]) square([side_spar_thickness/2.0, material_thickness-kerf]);
                 translate([side_spar_thickness/2.0,lipspaceRight,0]) square([side_spar_thickness/2.0, material_thickness-kerf]);
               } else {
                translate([0,lipspaceLeft,0]) square([side_spar_thickness/2.0, material_thickness-kerf]);
                translate([0,lipspaceRight,0]) square([side_spar_thickness/2.0, material_thickness-kerf]);
               }
          } else {
               normal_lip_spacing = acutalLipWidth / normal_lip_count;
               for(i=[0:normal_lip_count]) {
                                  if (!isReversed) {
                    translate([side_spar_thickness/2.0,lipspaceLeft + i*normal_lip_spacing,0]) square([side_spar_thickness/2.0, material_thickness-kerf]);
                                  } else {
                      translate([0,lipspaceLeft + i*normal_lip_spacing,0]) square([side_spar_thickness/2.0, material_thickness-kerf]);
                                }
                }
            }
        }
    }
    }
}
    

    
